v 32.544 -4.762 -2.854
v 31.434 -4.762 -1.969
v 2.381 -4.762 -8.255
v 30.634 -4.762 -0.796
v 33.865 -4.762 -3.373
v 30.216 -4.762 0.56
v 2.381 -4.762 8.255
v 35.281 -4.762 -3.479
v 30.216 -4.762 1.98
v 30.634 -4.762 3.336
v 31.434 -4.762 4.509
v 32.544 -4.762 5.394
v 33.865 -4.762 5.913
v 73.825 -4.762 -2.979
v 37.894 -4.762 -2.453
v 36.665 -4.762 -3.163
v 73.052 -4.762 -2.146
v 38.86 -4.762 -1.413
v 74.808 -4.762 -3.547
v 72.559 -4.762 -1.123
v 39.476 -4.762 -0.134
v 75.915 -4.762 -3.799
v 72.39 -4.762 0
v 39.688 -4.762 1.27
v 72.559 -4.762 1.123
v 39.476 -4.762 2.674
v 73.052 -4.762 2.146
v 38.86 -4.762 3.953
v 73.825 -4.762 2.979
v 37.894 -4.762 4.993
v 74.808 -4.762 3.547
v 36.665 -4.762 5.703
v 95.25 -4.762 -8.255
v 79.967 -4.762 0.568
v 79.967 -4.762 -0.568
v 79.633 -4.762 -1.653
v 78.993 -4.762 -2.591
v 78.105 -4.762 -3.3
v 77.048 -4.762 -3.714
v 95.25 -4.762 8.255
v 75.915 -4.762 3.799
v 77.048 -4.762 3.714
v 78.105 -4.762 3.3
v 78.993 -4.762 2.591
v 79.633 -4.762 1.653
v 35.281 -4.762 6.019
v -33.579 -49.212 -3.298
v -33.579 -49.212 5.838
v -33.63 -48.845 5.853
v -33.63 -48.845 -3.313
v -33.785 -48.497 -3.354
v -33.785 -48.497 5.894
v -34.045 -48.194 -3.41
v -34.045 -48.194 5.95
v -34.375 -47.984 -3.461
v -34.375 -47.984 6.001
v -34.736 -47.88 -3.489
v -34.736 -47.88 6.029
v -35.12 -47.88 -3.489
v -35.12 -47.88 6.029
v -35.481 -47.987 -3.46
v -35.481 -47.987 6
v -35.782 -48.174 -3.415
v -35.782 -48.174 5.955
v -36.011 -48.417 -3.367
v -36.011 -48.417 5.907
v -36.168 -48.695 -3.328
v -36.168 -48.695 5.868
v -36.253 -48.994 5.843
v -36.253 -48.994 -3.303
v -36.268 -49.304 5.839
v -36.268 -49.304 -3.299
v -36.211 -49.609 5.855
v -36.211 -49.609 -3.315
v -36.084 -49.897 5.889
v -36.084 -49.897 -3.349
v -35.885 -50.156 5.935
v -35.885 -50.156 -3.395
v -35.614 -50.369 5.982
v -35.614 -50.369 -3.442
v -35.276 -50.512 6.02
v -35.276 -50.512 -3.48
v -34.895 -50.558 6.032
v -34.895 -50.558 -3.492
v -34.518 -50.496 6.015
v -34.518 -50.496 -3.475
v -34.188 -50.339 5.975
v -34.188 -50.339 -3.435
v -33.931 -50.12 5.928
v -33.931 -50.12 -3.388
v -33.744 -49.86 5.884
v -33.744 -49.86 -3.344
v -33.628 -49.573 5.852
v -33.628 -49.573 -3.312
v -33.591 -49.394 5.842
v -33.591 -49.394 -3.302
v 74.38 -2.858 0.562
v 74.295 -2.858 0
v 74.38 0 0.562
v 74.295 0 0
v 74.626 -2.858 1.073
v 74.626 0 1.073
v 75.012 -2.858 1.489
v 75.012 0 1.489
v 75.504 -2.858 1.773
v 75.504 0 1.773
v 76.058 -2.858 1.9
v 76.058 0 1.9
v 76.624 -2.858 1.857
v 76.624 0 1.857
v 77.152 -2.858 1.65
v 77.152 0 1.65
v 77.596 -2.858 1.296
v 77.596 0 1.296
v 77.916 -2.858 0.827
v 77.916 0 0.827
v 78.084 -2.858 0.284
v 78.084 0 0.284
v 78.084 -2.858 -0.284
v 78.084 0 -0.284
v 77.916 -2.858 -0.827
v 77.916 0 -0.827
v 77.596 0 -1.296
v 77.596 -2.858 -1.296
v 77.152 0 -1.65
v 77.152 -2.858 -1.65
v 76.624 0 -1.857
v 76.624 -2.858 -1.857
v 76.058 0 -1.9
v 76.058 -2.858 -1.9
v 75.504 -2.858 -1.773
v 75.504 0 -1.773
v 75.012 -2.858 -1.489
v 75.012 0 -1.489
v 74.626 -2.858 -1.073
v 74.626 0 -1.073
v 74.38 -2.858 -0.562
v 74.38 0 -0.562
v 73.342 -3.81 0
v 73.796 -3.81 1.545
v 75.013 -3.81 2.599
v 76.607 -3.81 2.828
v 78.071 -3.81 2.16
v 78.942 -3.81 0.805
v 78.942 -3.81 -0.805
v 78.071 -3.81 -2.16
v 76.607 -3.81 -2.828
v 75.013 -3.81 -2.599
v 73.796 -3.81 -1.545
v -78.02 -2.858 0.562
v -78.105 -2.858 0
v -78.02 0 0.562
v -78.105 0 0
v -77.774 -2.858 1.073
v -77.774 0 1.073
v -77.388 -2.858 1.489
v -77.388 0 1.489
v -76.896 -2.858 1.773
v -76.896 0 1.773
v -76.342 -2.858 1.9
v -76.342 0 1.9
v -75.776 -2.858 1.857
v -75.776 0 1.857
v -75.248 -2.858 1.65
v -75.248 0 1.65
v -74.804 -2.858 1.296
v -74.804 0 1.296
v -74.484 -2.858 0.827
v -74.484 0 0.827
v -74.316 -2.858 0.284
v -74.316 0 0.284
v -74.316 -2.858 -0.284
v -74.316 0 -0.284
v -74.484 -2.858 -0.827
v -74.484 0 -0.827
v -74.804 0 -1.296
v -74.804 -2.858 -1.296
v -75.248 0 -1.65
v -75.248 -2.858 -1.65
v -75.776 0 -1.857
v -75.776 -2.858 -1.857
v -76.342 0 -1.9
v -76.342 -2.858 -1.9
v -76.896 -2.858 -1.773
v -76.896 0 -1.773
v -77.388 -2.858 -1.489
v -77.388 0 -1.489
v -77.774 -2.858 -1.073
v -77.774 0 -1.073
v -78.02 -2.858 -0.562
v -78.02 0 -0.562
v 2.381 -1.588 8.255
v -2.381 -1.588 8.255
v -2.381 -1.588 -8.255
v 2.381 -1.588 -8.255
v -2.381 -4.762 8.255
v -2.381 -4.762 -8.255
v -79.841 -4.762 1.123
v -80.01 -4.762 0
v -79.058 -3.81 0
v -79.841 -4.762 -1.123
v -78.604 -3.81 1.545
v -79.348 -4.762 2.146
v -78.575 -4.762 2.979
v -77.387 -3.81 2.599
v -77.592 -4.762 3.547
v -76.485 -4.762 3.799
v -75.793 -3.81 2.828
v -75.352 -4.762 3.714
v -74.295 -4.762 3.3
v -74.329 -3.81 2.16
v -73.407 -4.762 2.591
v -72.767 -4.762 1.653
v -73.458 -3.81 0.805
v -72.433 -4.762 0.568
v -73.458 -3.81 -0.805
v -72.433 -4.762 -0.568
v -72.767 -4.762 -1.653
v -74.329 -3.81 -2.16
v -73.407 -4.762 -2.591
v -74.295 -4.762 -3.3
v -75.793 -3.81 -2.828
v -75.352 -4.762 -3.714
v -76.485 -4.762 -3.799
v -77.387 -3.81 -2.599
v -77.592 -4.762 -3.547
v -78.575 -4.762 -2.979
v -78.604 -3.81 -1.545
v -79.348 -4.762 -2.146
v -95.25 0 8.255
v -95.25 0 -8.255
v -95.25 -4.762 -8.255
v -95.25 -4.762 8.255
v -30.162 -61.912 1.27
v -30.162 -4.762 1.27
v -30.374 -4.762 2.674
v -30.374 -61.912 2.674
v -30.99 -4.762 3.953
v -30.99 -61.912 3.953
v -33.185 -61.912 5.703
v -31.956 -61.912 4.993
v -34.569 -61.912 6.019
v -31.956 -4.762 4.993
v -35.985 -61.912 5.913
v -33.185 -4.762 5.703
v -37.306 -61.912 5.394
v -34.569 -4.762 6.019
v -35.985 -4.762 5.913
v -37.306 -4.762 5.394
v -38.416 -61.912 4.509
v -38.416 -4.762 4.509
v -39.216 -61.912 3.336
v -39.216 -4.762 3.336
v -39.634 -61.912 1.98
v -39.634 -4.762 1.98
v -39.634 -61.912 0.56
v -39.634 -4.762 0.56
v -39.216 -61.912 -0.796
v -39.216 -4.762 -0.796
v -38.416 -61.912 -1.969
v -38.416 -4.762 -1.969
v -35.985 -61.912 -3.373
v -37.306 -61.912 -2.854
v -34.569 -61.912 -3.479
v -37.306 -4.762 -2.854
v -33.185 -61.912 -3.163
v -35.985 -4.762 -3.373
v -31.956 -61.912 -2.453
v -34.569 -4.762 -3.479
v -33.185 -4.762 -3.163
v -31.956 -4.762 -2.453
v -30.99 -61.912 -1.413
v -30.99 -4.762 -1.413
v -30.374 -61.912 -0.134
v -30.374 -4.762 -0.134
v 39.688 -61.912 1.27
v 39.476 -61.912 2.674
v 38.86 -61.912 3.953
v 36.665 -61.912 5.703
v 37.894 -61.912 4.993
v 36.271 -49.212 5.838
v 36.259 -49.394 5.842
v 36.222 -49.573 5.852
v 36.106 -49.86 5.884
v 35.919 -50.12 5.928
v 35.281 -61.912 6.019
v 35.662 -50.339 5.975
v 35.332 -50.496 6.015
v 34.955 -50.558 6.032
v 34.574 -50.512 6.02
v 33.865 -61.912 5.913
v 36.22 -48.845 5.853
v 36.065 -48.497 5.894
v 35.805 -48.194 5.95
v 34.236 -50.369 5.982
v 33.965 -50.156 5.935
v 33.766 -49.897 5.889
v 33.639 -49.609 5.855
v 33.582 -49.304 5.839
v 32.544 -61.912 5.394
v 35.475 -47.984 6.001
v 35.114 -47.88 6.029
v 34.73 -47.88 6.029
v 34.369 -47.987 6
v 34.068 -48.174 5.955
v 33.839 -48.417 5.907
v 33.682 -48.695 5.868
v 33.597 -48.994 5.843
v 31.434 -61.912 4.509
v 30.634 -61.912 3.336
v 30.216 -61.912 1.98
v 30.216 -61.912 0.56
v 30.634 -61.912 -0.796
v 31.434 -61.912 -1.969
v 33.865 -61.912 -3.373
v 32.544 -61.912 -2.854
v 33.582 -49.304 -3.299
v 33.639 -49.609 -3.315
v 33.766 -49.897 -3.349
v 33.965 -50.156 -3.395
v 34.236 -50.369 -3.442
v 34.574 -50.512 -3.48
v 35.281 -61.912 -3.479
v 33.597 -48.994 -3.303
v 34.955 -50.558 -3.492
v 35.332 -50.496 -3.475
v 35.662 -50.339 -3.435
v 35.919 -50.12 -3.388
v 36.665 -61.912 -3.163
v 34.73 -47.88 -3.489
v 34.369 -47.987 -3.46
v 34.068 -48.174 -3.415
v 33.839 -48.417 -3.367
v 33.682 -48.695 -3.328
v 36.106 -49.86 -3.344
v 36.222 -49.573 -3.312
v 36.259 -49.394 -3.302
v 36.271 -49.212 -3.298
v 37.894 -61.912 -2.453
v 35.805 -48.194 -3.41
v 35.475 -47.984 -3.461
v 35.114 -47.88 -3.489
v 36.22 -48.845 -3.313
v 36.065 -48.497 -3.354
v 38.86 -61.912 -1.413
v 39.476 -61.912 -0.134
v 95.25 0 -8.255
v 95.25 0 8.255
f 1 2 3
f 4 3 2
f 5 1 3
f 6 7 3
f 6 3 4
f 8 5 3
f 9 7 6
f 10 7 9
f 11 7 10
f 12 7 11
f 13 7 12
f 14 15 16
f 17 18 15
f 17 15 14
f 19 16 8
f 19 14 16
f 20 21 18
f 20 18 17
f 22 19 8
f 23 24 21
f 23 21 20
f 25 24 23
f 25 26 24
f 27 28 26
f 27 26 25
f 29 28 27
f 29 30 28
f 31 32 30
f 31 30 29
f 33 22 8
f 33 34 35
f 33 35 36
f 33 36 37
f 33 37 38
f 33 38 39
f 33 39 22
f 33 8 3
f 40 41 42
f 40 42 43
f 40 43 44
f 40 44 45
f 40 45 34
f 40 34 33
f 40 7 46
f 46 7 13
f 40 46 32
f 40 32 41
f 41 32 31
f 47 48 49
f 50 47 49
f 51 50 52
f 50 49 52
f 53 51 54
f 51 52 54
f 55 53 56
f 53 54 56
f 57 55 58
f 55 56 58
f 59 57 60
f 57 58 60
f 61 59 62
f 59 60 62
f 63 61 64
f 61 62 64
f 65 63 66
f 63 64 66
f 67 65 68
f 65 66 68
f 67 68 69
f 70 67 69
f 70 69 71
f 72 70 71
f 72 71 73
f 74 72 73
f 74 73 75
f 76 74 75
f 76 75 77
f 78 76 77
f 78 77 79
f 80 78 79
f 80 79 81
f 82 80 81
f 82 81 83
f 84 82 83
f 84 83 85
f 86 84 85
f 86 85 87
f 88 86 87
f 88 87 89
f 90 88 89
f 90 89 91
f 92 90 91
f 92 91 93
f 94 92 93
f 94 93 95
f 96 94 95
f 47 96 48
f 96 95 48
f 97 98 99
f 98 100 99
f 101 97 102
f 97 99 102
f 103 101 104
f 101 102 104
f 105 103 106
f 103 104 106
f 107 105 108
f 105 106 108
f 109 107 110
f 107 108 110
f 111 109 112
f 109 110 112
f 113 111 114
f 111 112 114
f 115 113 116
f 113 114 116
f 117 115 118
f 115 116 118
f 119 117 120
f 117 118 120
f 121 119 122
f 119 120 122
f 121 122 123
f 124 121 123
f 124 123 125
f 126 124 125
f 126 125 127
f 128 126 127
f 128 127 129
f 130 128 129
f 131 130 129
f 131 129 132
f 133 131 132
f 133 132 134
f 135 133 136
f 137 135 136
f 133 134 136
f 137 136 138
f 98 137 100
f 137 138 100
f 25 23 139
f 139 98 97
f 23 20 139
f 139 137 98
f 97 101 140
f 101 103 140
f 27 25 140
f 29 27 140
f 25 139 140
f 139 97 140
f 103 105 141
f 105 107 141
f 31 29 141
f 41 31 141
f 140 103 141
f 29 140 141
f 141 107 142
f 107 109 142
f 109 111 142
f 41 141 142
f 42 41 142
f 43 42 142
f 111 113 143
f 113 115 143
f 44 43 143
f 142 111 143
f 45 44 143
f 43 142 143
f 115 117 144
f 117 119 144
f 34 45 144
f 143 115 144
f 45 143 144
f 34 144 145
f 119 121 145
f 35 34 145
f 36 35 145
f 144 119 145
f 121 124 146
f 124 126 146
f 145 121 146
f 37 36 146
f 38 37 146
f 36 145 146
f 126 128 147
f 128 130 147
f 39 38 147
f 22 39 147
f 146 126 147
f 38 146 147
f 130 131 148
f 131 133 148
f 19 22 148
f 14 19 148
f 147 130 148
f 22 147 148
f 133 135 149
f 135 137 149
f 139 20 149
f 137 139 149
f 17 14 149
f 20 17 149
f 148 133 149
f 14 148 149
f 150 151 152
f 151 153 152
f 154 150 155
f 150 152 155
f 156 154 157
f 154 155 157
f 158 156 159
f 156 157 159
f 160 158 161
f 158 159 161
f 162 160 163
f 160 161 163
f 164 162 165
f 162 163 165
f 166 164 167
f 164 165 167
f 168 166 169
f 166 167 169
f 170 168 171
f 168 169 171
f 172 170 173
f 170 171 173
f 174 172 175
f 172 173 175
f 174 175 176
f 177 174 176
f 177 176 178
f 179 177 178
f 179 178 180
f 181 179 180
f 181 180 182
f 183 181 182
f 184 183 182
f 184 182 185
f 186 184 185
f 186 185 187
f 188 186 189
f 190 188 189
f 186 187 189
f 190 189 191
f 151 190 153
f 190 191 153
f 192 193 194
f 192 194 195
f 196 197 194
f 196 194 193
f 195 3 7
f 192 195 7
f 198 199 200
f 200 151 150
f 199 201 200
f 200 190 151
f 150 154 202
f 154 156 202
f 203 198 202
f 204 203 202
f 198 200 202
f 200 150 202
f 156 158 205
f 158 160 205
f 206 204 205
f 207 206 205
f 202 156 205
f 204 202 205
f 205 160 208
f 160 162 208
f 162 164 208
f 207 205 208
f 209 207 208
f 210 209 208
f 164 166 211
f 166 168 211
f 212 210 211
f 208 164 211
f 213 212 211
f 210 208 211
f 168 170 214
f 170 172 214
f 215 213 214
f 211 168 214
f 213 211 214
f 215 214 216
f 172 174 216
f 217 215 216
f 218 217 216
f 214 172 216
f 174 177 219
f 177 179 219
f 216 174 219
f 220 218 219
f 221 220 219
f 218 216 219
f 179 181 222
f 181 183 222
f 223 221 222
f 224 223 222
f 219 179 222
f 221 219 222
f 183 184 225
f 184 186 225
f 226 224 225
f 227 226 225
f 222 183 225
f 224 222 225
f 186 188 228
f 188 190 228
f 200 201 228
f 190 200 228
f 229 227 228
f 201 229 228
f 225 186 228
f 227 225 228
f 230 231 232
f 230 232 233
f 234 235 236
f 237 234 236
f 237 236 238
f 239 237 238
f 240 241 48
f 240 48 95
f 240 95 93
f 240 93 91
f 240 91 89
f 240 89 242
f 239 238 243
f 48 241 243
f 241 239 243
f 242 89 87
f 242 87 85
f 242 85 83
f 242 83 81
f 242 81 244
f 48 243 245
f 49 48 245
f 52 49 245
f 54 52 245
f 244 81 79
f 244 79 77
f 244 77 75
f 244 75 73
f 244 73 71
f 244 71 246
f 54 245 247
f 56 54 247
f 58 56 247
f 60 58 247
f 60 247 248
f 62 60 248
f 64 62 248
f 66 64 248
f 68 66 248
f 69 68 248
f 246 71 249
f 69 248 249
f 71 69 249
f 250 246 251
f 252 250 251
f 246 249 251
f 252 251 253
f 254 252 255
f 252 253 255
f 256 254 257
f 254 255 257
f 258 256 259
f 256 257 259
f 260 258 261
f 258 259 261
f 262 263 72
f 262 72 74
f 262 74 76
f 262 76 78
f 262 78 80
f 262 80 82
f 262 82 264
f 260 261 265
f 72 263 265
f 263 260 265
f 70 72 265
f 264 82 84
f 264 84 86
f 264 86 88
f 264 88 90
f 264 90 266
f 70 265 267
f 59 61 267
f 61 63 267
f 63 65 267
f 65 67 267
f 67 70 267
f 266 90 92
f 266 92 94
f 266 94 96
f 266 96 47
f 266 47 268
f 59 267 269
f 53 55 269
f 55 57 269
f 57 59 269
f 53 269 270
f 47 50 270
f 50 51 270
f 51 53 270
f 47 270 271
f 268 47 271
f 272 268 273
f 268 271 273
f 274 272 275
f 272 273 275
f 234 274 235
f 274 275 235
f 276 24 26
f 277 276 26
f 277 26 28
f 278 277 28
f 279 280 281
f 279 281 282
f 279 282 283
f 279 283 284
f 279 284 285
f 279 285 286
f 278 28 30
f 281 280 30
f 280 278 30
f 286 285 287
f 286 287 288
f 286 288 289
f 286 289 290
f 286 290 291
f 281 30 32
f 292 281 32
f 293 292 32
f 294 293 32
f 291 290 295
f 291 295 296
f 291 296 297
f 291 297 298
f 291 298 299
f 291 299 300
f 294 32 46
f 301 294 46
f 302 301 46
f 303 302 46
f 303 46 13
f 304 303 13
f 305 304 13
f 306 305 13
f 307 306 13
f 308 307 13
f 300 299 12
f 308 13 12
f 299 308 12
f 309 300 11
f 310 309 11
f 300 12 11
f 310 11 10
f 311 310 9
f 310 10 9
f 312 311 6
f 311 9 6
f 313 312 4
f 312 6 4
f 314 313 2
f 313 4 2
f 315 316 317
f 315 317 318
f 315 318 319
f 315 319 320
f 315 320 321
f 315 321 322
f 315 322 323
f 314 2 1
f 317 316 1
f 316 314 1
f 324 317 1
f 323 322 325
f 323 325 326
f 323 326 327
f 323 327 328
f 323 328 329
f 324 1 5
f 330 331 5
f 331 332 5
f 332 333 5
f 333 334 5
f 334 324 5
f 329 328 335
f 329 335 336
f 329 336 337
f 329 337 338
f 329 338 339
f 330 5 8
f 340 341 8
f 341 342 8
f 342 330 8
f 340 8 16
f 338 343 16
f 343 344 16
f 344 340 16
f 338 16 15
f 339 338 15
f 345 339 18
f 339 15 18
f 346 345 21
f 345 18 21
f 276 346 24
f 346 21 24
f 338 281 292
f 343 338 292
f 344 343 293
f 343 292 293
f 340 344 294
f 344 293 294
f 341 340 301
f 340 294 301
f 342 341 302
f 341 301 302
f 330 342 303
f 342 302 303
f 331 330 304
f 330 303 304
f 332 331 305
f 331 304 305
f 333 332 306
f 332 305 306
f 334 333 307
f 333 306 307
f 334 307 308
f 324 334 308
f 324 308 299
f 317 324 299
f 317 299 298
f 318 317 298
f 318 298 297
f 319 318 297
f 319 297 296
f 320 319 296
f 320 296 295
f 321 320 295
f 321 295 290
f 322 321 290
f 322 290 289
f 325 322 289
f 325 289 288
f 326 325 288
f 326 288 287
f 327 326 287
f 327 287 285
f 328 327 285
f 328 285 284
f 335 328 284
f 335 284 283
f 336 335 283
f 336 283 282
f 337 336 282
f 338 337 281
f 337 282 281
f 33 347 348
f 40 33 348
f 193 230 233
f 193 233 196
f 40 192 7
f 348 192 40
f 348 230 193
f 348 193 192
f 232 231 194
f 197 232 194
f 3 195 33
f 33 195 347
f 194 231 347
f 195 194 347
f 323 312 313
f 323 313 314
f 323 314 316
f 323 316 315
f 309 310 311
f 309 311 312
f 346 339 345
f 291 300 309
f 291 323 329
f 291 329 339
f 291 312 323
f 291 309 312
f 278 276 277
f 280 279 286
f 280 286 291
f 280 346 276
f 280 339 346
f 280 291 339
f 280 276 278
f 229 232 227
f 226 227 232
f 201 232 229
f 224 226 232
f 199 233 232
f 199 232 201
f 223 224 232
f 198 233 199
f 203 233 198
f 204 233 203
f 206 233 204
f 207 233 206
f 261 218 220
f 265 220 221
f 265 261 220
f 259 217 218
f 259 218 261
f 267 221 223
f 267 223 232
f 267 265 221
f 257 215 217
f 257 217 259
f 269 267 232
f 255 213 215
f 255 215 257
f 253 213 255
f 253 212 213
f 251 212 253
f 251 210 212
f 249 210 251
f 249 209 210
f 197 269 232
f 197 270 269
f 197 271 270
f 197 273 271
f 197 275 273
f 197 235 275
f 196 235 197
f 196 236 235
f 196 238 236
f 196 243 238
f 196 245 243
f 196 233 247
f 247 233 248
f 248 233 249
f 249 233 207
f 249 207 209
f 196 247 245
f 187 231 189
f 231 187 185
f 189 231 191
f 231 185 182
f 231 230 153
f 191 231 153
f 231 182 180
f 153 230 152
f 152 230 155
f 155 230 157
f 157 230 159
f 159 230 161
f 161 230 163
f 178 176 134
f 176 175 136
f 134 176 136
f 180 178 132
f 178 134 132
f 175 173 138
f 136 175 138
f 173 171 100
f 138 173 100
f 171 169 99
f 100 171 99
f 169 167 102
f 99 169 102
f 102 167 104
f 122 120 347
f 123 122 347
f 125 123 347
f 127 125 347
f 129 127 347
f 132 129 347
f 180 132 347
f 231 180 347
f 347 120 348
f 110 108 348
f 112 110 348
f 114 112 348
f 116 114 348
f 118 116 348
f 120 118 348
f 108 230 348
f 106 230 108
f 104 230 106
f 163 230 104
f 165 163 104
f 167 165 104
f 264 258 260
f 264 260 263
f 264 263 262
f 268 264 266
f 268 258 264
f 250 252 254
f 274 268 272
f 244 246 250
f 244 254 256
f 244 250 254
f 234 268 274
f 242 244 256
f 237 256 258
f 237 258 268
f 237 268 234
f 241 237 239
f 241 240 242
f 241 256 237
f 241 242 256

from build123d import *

# Parameters (mm, degrees)
F0_W           = 190.5
F0_H           = 16.51
F1_DEPTH       = 4.7625
F2_R           = 4.7625
F3_DEPTH       = 57.15
F5_D           = 3.81
F5_CSINK_D     = 7.62
F5_CSINK_ANGLE = 90
F6_W           = 4.7625
F6_H           = 16.51
F7_DEPTH       = 3.175
F8_R           = 1.3462
F9_DEPTH       = 16.511


with BuildPart() as f1:
    # F0 (on Front) → F1 (new body)
    with BuildSketch(Plane.XZ):
        Rectangle(F0_W, F0_H)
    extrude(amount=F1_DEPTH)

    # F2 (on face) → F3 (join)
    with BuildSketch(Plane.XZ.offset(4.7625)):
        with Locations((-34.925, 1.27)):
            Circle(F2_R)
        with Locations((34.925, 1.27)):
            Circle(F2_R)
    extrude(amount=F3_DEPTH)

    # F5 (through all)
    with Locations(Plane.XZ.offset(4.7625)):
        with Locations((-76.2, 0), (76.2, 0)):
            CounterSinkHole(F5_D / 2, F5_CSINK_D / 2, counter_sink_angle=F5_CSINK_ANGLE)

    # F6 (on face) → F7 (cut)
    with BuildSketch(Plane.XZ.offset(4.7625)):
        Rectangle(F6_W, F6_H)
    extrude(amount=-F7_DEPTH, mode=Mode.SUBTRACT)

    # F8 (on face) → F9 (cut, through all)
    with BuildSketch(Plane.XY.offset(8.255)):
        with Locations((-34.925, -49.2125)):
            Circle(F8_R)
        with Locations((34.925, -49.2125)):
            Circle(F8_R)
    extrude(amount=-F9_DEPTH, mode=Mode.SUBTRACT)


solid = f1.part
